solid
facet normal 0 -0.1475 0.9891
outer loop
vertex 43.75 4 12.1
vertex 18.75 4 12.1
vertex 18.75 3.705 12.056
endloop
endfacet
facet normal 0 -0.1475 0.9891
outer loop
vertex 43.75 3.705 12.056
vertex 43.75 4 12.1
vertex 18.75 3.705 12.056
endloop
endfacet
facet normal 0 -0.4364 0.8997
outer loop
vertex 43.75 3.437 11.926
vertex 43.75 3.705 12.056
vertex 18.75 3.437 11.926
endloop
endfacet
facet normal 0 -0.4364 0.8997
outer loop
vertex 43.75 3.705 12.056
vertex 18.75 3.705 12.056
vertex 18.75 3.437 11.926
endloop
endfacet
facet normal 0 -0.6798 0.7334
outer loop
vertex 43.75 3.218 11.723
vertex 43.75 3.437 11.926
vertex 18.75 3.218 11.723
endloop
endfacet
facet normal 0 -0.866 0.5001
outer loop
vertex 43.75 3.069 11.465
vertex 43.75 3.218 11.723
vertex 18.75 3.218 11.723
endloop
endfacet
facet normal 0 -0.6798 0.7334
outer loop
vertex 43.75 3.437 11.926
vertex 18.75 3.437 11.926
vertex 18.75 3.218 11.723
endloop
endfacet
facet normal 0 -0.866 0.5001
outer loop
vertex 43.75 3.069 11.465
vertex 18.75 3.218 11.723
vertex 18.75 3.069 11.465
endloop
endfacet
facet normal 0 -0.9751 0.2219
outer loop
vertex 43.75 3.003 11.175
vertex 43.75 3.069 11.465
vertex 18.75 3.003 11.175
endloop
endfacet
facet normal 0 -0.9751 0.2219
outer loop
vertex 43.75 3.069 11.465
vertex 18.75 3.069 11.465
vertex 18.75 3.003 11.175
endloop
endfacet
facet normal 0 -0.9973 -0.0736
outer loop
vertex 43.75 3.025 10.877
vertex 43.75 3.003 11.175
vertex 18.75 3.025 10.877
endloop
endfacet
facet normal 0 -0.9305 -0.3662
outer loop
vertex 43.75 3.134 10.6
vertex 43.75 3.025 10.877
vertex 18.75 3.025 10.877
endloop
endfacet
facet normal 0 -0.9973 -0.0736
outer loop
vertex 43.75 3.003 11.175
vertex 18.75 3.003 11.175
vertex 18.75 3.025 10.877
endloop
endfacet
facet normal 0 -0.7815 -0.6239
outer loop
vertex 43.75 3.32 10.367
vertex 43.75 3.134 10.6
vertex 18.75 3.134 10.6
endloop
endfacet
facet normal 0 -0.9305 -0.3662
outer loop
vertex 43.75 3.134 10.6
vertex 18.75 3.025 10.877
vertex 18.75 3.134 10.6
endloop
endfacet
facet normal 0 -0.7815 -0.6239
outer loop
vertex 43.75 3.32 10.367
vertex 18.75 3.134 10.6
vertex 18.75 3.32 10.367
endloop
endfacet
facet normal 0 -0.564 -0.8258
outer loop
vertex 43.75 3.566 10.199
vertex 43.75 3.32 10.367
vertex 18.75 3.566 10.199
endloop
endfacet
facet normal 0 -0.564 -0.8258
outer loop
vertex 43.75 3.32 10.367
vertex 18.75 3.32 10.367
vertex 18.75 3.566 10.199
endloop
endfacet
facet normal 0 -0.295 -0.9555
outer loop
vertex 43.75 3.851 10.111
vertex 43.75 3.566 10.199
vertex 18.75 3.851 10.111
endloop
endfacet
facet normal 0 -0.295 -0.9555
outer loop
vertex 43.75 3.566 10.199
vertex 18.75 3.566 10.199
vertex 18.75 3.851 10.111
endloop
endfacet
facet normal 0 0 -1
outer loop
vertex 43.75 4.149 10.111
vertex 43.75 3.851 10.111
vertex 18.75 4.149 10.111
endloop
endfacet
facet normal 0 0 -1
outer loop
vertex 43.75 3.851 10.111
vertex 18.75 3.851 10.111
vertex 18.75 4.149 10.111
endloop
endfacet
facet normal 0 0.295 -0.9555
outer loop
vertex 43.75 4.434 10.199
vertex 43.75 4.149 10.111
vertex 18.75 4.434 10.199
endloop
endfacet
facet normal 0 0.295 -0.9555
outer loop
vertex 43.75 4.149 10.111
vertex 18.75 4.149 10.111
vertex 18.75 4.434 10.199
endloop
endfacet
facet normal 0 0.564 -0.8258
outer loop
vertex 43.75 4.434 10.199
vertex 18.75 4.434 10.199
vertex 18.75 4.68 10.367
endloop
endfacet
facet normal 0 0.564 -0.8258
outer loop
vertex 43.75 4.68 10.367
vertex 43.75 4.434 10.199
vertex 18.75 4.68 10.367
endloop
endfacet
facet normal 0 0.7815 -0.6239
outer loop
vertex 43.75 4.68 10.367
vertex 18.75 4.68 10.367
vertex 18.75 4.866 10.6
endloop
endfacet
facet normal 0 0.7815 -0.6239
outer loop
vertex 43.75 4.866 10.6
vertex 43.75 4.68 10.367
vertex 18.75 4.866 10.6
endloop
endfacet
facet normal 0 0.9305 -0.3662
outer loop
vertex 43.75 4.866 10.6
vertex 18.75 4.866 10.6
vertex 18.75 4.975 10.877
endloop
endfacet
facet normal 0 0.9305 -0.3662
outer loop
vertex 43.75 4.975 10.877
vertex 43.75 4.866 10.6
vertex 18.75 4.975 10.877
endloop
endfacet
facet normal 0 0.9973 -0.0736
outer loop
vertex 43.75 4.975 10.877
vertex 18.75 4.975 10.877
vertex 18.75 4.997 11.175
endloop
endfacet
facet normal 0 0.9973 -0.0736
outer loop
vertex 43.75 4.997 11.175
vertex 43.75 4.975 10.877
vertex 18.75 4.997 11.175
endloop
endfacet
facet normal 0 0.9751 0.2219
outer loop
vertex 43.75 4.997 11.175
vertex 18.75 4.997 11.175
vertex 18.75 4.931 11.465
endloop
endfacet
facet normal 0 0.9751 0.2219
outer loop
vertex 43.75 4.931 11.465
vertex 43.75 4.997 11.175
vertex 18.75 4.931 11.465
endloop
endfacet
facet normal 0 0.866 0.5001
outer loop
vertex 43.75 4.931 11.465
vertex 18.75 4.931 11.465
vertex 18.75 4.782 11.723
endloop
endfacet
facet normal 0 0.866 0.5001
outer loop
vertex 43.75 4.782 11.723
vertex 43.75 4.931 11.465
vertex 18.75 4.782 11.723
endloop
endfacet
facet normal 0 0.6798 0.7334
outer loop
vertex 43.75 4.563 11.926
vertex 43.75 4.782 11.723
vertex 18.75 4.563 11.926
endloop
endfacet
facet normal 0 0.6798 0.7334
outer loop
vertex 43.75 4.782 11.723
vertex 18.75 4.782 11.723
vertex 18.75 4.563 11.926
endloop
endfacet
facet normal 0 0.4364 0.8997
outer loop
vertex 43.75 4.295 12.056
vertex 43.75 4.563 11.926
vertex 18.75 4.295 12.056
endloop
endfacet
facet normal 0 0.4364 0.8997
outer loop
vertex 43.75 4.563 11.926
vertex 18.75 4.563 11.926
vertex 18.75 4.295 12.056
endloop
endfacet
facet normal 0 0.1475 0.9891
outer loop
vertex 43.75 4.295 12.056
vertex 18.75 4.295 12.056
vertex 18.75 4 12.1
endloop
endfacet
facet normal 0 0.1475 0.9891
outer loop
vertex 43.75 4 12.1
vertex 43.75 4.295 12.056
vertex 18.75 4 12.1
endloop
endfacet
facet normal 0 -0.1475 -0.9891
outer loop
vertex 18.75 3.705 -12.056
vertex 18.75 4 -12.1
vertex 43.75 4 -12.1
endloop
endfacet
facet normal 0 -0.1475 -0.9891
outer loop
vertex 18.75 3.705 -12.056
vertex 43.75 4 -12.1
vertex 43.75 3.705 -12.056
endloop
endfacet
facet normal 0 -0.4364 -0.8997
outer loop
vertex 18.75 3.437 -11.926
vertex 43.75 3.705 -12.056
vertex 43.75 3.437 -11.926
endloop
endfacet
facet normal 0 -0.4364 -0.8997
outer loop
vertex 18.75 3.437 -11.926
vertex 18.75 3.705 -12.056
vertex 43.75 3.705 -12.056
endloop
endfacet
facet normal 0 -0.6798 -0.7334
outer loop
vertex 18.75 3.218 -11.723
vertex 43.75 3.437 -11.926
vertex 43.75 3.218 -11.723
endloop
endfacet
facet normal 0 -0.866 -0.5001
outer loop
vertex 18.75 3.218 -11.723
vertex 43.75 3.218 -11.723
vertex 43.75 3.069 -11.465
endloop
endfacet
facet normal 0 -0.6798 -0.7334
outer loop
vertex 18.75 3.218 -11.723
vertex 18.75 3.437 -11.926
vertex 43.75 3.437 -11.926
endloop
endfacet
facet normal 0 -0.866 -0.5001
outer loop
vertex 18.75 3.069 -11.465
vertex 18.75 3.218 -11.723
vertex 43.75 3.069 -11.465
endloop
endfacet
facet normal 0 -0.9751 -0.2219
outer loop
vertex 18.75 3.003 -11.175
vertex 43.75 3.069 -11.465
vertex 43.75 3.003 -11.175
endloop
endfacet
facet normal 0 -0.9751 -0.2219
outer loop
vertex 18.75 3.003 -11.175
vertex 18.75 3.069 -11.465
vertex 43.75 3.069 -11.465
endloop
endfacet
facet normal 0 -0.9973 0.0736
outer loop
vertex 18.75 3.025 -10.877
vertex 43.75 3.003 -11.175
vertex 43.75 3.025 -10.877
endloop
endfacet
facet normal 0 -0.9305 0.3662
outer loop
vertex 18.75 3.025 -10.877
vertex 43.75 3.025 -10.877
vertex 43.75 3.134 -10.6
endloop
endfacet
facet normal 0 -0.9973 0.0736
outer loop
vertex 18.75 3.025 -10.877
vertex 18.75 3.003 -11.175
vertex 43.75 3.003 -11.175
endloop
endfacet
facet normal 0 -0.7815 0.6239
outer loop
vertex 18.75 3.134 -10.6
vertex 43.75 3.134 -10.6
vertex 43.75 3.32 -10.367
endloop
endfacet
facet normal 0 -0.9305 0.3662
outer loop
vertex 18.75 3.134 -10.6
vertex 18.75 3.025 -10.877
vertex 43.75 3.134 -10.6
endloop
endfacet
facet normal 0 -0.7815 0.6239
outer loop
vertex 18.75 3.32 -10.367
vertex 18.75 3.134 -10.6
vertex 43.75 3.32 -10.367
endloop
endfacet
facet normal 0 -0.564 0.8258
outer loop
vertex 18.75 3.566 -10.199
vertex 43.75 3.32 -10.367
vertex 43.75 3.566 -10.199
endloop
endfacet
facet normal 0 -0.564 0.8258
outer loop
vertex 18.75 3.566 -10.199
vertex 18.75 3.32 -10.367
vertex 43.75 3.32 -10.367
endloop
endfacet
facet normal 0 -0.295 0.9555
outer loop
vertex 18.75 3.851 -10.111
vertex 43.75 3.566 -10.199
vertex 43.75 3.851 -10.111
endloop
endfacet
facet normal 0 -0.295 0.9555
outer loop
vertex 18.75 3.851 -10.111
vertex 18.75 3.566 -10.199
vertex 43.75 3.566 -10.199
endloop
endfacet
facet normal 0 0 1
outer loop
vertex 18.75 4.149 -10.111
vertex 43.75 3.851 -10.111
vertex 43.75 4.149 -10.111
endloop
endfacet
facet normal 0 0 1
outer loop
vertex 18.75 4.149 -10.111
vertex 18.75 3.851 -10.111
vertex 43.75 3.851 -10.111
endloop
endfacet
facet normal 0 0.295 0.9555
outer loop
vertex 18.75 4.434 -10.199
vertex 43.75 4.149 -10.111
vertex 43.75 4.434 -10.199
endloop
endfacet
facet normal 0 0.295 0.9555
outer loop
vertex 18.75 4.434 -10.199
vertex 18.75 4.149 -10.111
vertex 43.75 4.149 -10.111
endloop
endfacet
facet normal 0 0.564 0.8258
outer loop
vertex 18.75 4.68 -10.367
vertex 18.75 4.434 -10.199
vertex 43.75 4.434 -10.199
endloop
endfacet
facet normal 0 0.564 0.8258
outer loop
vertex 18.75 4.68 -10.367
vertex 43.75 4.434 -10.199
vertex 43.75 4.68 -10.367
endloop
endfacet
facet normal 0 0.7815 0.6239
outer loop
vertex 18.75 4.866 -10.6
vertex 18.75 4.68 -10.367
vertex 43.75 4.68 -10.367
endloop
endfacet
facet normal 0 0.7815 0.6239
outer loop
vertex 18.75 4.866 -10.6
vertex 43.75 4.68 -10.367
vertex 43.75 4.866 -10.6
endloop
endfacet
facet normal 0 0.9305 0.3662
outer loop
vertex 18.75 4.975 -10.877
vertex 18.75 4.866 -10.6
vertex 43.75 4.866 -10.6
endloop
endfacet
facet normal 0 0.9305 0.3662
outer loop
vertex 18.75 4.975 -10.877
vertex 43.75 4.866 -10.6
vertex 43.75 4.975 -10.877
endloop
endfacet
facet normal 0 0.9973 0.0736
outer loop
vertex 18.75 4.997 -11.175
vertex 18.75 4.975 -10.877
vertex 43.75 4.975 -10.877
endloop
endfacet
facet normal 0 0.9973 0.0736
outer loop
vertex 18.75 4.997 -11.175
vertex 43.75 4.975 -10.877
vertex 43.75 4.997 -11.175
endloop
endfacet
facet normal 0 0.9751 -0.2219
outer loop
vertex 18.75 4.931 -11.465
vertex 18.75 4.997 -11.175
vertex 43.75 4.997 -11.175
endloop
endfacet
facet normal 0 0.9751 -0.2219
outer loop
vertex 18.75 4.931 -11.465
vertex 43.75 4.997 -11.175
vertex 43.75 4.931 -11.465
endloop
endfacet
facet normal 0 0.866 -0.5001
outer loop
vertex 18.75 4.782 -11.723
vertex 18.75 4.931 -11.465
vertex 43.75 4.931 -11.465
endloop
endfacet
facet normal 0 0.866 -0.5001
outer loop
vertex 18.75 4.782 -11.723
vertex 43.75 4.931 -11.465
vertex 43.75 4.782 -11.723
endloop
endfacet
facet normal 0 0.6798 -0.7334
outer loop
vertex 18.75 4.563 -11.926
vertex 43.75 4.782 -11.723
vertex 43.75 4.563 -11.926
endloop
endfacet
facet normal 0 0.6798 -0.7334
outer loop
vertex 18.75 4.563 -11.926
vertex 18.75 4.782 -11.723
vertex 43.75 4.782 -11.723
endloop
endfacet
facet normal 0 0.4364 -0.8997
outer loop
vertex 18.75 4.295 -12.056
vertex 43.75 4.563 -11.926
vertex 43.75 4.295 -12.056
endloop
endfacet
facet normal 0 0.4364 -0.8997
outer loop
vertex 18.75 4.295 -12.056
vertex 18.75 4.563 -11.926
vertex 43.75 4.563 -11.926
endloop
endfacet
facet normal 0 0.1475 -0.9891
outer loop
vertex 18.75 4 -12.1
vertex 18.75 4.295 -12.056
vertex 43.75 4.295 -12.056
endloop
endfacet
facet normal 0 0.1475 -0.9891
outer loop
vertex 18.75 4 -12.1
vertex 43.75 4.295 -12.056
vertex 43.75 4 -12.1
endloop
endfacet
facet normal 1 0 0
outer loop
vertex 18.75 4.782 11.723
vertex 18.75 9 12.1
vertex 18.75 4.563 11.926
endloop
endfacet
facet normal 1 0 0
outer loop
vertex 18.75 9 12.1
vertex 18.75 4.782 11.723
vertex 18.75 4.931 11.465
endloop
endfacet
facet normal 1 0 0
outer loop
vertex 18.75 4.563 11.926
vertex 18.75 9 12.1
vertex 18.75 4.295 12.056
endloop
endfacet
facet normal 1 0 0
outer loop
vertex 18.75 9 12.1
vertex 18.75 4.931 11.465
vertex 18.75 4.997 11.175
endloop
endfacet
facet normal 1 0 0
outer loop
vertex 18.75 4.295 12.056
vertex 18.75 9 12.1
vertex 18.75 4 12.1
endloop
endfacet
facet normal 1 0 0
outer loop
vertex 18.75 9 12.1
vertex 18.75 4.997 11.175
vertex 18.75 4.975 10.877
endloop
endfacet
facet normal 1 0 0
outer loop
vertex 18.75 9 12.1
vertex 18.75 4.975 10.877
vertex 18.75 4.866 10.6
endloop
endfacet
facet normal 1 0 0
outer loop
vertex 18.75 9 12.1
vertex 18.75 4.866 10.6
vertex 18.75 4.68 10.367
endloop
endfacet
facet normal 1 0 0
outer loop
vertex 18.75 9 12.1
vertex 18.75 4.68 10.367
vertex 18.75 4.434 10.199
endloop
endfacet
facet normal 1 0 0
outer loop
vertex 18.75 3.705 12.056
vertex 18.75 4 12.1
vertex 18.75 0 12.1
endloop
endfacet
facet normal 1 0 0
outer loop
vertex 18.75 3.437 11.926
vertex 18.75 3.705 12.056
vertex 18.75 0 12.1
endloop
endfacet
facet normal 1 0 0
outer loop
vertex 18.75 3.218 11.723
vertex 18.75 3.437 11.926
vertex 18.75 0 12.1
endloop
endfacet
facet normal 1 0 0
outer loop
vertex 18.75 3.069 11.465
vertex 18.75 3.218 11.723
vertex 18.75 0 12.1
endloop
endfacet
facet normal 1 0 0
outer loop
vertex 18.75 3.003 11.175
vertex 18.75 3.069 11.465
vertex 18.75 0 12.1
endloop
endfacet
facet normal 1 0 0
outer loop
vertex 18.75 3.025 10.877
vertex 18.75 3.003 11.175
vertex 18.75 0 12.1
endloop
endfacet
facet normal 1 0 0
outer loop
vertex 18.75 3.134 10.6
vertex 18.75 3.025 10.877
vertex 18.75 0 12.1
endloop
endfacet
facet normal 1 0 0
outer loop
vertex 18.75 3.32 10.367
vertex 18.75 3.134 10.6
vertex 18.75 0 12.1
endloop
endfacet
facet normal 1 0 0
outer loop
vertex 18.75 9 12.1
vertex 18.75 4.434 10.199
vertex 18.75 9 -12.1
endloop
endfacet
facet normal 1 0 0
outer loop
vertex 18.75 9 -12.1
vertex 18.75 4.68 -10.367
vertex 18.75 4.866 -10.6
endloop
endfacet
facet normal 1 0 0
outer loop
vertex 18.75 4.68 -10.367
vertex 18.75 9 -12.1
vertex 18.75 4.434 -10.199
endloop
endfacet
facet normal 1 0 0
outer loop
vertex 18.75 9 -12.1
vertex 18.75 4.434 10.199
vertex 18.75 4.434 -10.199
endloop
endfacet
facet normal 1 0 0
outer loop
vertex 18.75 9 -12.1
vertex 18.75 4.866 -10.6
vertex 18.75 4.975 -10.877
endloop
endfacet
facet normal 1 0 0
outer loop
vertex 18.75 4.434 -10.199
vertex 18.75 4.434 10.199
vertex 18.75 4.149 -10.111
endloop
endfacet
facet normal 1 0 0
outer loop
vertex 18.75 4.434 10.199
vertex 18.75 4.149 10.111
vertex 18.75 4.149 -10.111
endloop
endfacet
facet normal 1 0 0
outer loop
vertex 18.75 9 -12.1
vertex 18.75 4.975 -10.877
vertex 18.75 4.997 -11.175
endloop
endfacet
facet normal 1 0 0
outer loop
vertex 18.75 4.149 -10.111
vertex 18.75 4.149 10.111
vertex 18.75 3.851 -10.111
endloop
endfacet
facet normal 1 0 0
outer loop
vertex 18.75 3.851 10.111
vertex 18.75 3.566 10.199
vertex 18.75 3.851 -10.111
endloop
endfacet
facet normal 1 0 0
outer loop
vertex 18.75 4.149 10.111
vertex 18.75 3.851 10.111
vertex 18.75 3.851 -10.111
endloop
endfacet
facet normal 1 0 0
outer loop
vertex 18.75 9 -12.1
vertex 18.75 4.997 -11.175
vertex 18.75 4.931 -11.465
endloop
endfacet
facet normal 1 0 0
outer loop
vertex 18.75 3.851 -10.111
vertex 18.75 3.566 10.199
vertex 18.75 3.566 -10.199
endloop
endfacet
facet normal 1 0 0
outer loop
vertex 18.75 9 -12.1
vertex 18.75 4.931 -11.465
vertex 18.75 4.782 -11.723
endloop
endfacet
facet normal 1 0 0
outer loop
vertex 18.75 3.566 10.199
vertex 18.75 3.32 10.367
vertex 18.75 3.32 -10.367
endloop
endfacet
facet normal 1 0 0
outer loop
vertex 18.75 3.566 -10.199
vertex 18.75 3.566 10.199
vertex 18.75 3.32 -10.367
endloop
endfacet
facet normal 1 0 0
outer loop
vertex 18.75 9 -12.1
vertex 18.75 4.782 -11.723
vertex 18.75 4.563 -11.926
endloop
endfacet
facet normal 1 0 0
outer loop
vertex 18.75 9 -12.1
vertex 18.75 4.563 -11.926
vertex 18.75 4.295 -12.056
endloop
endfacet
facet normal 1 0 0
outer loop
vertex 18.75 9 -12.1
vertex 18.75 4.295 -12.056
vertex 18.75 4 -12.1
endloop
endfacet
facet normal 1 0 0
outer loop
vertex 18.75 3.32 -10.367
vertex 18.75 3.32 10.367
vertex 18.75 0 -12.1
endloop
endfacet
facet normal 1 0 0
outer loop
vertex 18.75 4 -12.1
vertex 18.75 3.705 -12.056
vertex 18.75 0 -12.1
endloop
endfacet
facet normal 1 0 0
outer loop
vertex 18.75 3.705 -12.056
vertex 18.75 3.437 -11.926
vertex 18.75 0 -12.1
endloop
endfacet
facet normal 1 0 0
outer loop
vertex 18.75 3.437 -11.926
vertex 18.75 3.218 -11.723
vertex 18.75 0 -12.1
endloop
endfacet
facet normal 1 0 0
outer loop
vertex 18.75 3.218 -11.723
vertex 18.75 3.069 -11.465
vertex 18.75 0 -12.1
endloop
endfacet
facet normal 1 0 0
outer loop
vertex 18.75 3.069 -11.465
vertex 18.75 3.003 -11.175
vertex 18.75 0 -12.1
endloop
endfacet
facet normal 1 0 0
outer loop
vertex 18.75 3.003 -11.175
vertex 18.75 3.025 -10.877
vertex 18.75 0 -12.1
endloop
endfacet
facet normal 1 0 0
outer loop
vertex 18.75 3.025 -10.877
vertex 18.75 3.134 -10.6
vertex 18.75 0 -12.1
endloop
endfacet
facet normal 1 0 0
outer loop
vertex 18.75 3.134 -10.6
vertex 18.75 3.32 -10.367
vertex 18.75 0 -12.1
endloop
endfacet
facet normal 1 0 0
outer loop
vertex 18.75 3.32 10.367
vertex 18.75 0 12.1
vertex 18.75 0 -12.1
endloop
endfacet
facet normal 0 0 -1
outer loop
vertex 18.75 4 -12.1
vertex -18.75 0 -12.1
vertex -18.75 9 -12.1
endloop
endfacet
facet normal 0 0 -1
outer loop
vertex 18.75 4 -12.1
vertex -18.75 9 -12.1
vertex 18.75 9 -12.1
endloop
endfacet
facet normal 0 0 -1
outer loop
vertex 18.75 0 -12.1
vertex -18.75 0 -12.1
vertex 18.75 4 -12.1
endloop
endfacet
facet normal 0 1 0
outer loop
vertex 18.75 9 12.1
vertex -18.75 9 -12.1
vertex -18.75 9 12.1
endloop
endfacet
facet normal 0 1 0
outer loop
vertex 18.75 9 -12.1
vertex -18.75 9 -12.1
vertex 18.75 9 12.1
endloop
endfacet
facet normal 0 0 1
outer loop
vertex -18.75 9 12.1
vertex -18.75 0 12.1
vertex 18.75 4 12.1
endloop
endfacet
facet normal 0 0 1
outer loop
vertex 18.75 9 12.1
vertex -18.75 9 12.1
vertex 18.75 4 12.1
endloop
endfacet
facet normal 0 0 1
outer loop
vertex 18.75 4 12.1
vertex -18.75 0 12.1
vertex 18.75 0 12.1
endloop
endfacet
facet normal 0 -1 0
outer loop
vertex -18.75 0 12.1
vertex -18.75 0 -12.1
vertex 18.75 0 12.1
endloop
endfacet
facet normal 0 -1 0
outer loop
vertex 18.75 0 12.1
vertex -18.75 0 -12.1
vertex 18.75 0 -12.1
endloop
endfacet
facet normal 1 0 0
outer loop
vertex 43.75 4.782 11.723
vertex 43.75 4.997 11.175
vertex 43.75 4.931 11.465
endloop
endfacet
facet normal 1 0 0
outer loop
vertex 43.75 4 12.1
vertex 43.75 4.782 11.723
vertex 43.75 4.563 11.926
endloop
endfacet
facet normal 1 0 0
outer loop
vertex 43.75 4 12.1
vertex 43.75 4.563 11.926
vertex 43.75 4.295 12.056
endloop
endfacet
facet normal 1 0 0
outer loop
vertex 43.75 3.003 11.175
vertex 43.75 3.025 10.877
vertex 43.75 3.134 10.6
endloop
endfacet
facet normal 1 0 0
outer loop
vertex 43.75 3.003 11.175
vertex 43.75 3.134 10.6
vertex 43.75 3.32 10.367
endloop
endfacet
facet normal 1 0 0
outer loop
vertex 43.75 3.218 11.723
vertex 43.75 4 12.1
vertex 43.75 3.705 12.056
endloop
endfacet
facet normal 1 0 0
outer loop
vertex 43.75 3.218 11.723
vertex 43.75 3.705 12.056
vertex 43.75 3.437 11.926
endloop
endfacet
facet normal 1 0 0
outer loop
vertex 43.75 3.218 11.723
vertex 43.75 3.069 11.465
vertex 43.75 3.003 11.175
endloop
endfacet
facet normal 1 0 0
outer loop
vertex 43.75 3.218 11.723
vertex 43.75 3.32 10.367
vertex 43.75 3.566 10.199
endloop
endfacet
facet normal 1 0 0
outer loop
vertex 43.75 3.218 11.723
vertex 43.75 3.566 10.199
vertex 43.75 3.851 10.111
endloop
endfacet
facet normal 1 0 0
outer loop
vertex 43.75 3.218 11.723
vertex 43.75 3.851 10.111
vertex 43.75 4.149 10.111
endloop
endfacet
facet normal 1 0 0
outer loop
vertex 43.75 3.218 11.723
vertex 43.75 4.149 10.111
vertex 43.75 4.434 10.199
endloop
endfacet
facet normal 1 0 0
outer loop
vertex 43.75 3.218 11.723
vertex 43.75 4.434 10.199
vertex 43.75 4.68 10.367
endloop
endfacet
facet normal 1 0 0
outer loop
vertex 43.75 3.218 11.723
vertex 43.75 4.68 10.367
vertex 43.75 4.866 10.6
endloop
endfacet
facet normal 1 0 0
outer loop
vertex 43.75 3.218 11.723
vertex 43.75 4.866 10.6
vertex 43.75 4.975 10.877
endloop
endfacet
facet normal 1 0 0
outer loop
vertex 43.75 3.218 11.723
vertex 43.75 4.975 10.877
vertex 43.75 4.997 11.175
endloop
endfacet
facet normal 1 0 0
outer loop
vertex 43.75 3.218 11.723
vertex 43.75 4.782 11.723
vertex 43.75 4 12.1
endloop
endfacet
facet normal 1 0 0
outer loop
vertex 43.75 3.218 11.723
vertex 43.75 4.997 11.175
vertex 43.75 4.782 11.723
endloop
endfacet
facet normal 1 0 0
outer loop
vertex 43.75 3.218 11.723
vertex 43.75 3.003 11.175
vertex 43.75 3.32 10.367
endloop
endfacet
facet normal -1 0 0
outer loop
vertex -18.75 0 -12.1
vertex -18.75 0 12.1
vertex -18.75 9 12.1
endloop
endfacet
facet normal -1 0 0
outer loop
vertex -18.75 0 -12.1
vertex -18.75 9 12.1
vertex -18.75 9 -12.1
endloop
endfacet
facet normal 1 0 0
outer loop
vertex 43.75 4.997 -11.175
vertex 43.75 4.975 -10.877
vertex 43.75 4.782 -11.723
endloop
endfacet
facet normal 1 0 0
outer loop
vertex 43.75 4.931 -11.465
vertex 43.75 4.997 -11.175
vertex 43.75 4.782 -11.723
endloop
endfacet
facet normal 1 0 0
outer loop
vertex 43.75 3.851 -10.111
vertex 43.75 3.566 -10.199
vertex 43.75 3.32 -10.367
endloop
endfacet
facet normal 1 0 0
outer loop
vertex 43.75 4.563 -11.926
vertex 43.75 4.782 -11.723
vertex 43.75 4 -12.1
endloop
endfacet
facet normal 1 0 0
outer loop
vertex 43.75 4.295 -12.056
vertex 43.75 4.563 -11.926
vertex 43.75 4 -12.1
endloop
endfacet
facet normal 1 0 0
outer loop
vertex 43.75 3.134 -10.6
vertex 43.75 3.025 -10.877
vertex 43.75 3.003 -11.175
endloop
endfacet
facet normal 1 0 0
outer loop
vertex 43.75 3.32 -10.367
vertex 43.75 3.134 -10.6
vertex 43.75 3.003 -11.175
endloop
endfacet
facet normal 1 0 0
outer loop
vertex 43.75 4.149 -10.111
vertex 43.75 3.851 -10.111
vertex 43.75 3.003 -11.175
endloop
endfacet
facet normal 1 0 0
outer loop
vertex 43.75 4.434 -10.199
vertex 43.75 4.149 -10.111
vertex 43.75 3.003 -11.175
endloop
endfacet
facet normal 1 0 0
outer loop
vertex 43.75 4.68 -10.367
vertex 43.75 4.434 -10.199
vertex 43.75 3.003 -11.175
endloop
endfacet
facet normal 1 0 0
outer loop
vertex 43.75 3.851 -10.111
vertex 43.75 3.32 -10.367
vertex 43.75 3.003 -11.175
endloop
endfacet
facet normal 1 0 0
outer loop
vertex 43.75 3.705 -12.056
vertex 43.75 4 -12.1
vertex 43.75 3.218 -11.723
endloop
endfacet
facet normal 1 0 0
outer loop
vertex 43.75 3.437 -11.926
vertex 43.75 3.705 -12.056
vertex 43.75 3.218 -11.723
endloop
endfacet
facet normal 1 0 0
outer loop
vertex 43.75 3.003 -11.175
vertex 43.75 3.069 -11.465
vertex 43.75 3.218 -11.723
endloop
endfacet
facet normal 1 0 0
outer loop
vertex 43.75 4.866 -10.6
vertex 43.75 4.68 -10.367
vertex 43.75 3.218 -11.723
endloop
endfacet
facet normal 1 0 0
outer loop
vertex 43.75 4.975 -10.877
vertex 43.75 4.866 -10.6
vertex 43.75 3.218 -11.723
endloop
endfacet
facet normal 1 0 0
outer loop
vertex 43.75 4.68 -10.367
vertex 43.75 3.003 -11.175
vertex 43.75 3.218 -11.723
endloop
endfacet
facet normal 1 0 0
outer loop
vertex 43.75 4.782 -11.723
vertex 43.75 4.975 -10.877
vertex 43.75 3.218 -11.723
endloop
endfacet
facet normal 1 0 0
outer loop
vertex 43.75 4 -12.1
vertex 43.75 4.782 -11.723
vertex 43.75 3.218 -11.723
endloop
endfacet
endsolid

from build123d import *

# Parameters (mm, degrees)
SKETCH2_W           = 37.5
SKETCH2_H           = 24.2
BOSS_EXTRUDE1_DEPTH = 9
SKETCH3_R           = 1
BOSS_EXTRUDE2_DEPTH = 25


with BuildPart() as part:
    # Sketch2 → Boss-Extrude1 (new body)
    with BuildSketch(Plane(origin=(0, 0, 0), x_dir=(1, 0, 0), z_dir=(0, 1, 0))):
        Rectangle(SKETCH2_W, SKETCH2_H)
    extrude(amount=BOSS_EXTRUDE1_DEPTH)

    # Sketch3 → Boss-Extrude2 (add)
    with BuildSketch(Plane(origin=(18.75, 0, 0), x_dir=(0, 0, -1), z_dir=(1, 0, 0))):
        with Locations(Location((-11.1, 4, 0), (0, 0, 180))):
            Circle(SKETCH3_R)
    boss_extrude2 = extrude(amount=BOSS_EXTRUDE2_DEPTH)

    # Mirror1: Boss-Extrude2 across plane
    add(boss_extrude2.mirror(Plane.XY))


solid = part.part
